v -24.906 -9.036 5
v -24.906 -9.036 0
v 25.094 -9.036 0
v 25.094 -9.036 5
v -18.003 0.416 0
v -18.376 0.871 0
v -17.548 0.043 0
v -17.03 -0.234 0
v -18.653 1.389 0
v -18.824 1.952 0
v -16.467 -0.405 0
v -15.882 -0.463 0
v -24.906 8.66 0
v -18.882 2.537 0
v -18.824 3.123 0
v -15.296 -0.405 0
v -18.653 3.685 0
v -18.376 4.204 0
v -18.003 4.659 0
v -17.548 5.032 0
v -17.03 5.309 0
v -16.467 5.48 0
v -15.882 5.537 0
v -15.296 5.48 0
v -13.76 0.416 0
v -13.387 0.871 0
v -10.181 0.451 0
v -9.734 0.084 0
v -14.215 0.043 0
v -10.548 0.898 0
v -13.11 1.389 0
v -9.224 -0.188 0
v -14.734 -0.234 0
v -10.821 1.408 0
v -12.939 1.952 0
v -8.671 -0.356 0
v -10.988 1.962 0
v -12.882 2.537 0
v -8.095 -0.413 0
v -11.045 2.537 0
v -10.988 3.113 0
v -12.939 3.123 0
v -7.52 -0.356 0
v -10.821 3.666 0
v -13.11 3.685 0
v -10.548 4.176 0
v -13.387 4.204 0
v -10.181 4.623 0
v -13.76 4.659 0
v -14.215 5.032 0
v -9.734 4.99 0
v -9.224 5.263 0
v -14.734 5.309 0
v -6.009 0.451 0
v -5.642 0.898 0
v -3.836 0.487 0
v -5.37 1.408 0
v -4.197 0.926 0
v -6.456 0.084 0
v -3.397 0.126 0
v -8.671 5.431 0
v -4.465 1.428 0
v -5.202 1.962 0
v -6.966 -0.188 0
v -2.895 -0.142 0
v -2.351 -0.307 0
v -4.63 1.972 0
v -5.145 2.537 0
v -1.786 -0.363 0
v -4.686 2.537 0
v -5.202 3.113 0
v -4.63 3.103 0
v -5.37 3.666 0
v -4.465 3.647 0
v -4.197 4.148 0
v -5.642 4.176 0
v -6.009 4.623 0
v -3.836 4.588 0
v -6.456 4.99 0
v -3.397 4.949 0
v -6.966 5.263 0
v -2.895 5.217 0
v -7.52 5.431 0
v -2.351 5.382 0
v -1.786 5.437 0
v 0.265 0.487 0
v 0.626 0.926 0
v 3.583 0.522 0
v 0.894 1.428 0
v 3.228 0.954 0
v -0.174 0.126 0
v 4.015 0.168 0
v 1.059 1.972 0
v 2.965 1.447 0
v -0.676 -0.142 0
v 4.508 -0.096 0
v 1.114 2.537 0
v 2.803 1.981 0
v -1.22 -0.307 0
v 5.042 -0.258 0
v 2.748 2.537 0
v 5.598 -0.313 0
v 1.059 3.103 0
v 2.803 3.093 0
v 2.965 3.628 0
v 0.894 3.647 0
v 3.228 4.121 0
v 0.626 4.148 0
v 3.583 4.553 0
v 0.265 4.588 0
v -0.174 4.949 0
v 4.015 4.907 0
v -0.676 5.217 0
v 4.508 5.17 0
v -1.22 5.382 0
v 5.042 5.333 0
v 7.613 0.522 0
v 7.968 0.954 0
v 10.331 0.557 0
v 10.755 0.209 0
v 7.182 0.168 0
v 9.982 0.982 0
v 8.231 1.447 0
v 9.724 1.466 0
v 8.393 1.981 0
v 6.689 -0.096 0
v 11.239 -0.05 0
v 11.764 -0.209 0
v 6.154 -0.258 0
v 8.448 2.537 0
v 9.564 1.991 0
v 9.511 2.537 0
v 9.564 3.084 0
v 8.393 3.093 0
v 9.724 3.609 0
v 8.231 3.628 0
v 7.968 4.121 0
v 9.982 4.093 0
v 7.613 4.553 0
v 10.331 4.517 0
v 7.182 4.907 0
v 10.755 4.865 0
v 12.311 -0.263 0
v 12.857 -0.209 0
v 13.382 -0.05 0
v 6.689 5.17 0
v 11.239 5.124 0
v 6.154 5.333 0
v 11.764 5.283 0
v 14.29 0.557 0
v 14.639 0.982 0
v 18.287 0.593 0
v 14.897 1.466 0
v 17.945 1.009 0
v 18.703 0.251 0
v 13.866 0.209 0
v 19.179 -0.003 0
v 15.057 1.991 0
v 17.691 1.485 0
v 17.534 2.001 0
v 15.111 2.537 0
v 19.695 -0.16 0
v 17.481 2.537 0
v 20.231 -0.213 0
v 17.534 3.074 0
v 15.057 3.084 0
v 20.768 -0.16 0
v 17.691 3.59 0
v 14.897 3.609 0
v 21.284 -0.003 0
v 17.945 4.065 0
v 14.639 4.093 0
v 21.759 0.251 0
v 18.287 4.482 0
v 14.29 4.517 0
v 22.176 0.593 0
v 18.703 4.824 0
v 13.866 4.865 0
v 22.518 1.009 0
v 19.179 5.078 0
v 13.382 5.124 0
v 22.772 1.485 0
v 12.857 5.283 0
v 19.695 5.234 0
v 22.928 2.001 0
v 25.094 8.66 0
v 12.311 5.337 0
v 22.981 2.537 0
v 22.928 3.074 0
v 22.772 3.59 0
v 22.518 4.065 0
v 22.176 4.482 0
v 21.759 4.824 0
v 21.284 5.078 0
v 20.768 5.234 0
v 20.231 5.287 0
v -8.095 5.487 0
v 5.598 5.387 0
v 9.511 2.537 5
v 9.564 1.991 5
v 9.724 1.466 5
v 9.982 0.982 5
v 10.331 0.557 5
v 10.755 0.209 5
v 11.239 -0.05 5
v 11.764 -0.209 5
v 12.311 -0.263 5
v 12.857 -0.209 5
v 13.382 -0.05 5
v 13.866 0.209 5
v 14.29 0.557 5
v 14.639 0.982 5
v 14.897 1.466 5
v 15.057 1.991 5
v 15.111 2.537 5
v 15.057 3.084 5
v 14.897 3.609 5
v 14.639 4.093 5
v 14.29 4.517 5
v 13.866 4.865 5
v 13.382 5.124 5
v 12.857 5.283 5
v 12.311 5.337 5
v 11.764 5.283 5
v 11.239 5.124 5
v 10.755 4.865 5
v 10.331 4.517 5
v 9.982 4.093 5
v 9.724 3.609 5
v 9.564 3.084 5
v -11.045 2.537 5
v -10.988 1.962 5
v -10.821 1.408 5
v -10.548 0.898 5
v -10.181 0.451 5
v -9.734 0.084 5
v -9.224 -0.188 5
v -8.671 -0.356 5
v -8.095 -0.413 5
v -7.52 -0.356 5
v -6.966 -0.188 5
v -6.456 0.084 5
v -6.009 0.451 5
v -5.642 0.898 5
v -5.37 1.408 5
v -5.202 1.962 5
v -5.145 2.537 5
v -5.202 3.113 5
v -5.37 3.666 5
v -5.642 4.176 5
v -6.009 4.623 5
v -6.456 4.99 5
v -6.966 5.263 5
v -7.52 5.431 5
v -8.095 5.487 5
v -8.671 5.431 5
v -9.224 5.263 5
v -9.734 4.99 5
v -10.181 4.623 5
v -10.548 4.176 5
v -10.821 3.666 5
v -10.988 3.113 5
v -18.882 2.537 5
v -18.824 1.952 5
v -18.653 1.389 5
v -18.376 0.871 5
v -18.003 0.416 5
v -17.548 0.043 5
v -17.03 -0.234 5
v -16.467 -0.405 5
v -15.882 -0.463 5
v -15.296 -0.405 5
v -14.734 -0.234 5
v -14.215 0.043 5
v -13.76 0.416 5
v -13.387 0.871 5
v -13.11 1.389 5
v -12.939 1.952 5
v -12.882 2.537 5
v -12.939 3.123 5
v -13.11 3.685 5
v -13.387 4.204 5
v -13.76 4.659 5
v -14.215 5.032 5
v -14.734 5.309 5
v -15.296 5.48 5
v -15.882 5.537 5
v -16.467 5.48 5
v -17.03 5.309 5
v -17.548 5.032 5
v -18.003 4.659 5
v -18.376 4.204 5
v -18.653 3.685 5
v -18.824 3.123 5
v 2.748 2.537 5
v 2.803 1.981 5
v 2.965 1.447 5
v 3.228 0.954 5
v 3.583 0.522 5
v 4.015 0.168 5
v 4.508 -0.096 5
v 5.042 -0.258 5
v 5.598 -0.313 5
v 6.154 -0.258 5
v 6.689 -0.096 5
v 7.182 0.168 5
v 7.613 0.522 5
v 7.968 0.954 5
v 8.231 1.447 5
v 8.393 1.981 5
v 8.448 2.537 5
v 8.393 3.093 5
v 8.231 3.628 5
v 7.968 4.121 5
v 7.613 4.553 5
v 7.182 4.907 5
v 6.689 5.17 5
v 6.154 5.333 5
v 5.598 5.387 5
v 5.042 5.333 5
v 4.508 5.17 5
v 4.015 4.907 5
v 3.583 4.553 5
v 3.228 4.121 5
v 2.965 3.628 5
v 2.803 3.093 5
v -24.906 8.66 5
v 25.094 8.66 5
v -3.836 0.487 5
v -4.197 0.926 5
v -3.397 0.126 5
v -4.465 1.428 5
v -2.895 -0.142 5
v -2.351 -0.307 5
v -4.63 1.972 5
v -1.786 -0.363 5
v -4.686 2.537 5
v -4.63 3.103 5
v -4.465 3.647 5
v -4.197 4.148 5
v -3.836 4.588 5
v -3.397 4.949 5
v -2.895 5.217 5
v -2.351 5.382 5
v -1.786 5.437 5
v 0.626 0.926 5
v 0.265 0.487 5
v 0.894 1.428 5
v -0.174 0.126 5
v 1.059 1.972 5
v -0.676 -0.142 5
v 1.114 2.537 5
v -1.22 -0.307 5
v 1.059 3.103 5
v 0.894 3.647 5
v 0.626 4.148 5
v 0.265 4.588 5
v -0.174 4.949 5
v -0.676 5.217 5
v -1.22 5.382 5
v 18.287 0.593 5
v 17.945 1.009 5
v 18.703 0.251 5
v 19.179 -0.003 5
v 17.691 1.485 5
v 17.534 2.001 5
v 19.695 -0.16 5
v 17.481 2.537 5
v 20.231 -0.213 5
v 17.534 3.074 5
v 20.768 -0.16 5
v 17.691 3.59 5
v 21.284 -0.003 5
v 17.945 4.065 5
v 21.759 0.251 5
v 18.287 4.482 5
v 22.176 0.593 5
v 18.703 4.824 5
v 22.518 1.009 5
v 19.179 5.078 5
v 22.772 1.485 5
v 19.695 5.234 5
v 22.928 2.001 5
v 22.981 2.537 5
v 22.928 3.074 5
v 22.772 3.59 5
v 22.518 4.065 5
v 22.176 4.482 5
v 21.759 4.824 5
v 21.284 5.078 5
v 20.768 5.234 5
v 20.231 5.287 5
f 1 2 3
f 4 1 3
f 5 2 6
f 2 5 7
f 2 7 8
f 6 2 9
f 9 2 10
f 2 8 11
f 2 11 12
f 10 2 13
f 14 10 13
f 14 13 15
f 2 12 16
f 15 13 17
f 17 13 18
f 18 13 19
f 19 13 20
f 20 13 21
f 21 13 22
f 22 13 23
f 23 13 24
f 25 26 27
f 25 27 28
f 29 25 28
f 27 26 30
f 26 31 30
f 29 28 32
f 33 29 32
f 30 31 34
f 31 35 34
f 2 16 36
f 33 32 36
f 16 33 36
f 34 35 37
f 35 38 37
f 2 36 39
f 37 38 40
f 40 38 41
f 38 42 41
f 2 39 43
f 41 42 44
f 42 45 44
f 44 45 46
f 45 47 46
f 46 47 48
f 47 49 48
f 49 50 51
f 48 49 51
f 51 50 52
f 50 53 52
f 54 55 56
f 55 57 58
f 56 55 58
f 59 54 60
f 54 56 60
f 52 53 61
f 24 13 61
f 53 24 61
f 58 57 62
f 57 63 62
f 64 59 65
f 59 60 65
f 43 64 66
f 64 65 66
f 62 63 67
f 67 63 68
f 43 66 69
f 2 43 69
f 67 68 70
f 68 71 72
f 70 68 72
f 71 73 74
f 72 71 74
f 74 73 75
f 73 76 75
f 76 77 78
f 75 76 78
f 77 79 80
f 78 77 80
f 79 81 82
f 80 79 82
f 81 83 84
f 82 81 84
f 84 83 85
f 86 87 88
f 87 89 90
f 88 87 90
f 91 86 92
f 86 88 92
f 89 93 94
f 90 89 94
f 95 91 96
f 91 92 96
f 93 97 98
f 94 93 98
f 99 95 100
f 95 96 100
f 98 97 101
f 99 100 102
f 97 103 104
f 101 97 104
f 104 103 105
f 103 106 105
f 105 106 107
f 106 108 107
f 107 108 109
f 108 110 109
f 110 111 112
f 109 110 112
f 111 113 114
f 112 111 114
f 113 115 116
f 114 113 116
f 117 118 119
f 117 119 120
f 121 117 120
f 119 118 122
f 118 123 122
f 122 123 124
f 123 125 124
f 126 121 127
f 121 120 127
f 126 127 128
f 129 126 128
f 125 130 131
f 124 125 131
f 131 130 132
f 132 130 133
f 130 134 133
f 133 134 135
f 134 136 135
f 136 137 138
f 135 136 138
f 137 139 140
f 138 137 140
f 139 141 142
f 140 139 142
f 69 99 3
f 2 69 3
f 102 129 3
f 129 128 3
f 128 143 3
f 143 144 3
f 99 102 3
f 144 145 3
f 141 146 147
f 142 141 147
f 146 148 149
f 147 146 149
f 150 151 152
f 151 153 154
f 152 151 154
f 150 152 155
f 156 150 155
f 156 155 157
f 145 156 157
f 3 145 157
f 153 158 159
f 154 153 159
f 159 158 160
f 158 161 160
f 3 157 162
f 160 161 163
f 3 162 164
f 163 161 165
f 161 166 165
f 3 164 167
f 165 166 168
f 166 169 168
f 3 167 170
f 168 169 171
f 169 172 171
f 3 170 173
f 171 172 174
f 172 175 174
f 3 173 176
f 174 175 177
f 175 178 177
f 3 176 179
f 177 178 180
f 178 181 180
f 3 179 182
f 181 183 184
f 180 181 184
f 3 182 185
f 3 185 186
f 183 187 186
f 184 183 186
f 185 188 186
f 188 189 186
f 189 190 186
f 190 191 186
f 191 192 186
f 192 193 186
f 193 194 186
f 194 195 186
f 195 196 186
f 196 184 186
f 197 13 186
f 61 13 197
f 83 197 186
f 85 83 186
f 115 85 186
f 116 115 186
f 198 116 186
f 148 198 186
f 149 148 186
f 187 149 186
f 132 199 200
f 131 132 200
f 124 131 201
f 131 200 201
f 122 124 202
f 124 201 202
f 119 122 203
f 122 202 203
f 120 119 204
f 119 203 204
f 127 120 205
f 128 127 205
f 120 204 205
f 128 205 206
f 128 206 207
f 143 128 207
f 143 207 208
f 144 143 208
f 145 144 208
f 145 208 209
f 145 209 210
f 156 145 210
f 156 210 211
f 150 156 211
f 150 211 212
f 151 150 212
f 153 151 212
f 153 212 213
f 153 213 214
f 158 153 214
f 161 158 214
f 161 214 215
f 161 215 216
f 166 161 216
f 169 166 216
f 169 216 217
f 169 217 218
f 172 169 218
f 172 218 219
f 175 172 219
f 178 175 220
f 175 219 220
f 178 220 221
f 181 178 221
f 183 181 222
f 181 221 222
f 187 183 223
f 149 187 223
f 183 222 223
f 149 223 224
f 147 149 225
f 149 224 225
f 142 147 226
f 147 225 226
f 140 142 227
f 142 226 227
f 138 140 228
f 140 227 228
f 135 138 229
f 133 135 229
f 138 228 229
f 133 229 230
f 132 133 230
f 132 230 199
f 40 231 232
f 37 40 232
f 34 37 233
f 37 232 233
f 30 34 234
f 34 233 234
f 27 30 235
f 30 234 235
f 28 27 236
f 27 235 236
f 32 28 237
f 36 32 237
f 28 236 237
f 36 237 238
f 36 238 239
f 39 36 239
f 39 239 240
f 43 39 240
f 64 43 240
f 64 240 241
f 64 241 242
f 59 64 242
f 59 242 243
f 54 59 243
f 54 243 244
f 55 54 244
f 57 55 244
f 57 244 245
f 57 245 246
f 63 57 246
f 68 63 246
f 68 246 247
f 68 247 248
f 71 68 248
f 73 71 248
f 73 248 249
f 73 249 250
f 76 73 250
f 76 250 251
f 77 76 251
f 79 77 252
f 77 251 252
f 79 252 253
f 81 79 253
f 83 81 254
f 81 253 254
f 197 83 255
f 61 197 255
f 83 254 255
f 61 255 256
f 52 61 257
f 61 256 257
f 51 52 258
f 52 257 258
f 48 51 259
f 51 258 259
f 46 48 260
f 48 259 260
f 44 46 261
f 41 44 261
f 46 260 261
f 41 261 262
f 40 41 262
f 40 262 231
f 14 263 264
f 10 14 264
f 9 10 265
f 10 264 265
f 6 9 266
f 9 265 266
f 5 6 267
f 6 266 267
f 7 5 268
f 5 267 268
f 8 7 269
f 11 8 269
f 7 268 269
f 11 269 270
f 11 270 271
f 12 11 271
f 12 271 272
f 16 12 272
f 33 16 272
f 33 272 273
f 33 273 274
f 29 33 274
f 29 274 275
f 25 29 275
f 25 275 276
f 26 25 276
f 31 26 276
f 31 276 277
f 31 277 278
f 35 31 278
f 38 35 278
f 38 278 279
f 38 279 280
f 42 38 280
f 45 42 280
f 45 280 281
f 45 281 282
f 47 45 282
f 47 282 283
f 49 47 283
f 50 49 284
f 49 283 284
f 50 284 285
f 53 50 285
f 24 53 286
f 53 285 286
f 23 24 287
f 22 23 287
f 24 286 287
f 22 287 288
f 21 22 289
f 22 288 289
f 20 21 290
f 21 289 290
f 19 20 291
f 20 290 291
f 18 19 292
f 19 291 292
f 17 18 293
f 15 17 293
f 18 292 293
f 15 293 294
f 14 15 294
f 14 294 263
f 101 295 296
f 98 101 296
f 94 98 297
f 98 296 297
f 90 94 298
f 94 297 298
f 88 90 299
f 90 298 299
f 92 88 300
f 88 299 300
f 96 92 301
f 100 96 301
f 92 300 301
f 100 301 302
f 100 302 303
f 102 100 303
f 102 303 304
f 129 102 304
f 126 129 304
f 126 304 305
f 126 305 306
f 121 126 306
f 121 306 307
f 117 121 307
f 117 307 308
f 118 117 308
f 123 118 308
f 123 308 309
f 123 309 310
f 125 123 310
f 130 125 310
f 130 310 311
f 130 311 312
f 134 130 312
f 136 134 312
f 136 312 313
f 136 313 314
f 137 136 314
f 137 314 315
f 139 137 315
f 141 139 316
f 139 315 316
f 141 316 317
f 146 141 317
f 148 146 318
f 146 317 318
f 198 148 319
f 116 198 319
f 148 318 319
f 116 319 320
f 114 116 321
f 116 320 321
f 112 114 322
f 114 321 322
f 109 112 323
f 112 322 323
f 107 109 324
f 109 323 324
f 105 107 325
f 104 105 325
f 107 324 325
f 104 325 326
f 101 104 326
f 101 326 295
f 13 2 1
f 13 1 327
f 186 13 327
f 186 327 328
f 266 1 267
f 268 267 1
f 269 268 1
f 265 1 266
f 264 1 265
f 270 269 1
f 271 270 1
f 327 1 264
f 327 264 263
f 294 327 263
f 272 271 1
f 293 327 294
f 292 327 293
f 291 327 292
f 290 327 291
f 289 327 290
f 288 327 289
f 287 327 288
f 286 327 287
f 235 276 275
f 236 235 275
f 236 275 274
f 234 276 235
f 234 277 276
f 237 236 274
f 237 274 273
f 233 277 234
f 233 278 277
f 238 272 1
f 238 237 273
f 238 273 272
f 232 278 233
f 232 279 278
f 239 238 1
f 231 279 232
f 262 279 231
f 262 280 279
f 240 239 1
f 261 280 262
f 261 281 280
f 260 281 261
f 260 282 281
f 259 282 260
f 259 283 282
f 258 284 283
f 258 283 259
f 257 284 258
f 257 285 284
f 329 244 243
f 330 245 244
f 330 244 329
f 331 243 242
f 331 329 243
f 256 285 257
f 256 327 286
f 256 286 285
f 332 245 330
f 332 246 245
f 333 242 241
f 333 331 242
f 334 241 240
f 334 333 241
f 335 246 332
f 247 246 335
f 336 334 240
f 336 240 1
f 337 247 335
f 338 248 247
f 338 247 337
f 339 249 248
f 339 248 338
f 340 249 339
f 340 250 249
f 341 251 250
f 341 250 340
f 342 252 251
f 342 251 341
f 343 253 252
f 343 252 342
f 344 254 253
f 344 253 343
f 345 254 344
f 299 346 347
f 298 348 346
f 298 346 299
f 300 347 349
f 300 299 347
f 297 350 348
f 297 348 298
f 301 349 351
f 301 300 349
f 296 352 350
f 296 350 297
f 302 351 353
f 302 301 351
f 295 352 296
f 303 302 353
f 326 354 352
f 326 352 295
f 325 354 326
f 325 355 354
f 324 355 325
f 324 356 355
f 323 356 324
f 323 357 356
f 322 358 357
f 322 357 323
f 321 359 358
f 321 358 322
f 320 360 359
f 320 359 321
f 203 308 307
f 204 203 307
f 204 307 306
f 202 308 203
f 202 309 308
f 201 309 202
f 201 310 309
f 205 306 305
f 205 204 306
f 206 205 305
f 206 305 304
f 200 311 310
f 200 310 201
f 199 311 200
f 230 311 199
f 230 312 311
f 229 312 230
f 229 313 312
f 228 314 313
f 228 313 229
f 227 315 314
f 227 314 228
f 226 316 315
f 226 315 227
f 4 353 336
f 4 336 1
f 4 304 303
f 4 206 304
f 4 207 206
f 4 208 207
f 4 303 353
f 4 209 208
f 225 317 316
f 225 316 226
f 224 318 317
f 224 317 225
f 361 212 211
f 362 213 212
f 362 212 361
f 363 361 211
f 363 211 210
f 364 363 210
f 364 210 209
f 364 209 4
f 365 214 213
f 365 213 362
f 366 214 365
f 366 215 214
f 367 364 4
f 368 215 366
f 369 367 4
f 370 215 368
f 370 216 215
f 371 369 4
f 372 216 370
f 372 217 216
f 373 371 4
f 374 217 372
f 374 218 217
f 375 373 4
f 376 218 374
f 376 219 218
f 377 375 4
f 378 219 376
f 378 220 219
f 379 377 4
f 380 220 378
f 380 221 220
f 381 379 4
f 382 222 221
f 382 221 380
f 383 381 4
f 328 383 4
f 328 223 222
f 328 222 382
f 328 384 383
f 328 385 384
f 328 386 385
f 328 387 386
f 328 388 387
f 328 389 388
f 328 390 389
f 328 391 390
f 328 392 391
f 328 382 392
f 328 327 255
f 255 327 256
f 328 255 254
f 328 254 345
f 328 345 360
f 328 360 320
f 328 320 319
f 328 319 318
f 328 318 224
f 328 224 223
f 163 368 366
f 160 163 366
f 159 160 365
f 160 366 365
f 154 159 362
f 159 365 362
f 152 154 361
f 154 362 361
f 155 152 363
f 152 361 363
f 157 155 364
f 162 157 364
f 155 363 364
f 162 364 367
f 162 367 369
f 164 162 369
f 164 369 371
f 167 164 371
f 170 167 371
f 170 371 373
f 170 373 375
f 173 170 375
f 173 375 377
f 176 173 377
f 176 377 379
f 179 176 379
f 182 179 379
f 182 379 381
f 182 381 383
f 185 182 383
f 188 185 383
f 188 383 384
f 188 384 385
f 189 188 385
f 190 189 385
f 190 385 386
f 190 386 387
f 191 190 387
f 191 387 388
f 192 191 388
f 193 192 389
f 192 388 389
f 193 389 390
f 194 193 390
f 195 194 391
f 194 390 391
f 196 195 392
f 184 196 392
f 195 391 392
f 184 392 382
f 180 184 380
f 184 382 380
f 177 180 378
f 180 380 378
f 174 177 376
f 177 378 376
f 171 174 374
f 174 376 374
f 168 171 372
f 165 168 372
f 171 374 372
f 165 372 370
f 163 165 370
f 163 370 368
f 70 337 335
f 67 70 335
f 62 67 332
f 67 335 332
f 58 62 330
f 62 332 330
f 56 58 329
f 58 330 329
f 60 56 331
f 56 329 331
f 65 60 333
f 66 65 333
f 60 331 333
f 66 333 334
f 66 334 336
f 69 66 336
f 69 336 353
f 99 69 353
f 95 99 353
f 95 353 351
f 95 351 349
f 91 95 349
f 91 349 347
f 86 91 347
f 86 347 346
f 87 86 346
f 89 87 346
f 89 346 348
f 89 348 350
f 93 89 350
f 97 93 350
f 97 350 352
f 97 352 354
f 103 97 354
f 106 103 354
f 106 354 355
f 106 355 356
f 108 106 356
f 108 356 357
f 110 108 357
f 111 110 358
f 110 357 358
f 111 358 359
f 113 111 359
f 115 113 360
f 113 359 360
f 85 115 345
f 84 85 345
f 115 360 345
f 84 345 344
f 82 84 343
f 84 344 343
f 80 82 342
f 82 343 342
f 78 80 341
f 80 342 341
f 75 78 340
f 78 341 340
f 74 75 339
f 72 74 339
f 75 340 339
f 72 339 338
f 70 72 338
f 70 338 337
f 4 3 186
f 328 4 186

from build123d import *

# Parameters (mm, degrees)
F0_W     = 50
F0_H     = 17.6952143589
F1_DEPTH = 5
F2_D     = 6
F2_DEPTH = 12
F2_TIP   = 1.8025818571
F3_D     = 5.9
F3_DEPTH = 12
F3_TIP   = 1.7725388261
F4_D     = 5.8
F4_DEPTH = 12
F4_TIP   = 1.7424957952
F5_D     = 5.7
F5_DEPTH = 12
F5_TIP   = 1.7124527642
F6_D     = 5.6
F6_DEPTH = 12
F6_TIP   = 1.6824097333
F7_D     = 5.5
F7_DEPTH = 12
F7_TIP   = 1.6523667023


with BuildPart() as f1:
    # F0 (on Top) → F1 (new body)
    with BuildSketch(Plane.XY):
        with Locations((0.0939741731, -0.1879474148)):
            Rectangle(F0_W, F0_H)
    extrude(amount=F1_DEPTH)

    # F2
    with Locations(Plane(origin=(0, 0, 0), x_dir=(1, 0, 0), z_dir=(0, 0, -1))):
        with Locations((-15.8815626055, -2.5372912642)):
            Hole(F2_D / 2, depth=F2_DEPTH)
            with Locations((0, 0, -(F2_DEPTH + F2_TIP / 2))):  # 118° drill point
                Cone(0, F2_D / 2, F2_TIP, mode=Mode.SUBTRACT)

    # F3
    with Locations(Plane(origin=(0, 0, 0), x_dir=(1, 0, 0), z_dir=(0, 0, -1))):
        with Locations((-8.0951671781, -2.5372912642)):
            Hole(F3_D / 2, depth=F3_DEPTH)
            with Locations((0, 0, -(F3_DEPTH + F3_TIP / 2))):  # 118° drill point
                Cone(0, F3_D / 2, F3_TIP, mode=Mode.SUBTRACT)

    # F4
    with Locations(Plane(origin=(0, 0, 0), x_dir=(1, 0, 0), z_dir=(0, 0, -1))):
        with Locations((-1.7855006403, -2.5372912642)):
            Hole(F4_D / 2, depth=F4_DEPTH)
            with Locations((0, 0, -(F4_DEPTH + F4_TIP / 2))):  # 118° drill point
                Cone(0, F4_D / 2, F4_TIP, mode=Mode.SUBTRACT)

    # F5
    with Locations(Plane(origin=(0, 0, 0), x_dir=(1, 0, 0), z_dir=(0, 0, -1))):
        with Locations((5.5981517902, -2.5372912642)):
            Hole(F5_D / 2, depth=F5_DEPTH)
            with Locations((0, 0, -(F5_DEPTH + F5_TIP / 2))):  # 118° drill point
                Cone(0, F5_D / 2, F5_TIP, mode=Mode.SUBTRACT)

    # F6
    with Locations(Plane(origin=(0, 0, 0), x_dir=(1, 0, 0), z_dir=(0, 0, -1))):
        with Locations((12.3105607927, -2.5372912642)):
            Hole(F6_D / 2, depth=F6_DEPTH)
            with Locations((0, 0, -(F6_DEPTH + F6_TIP / 2))):  # 118° drill point
                Cone(0, F6_D / 2, F6_TIP, mode=Mode.SUBTRACT)

    # F7
    with Locations(Plane(origin=(0, 0, 0), x_dir=(1, 0, 0), z_dir=(0, 0, -1))):
        with Locations((20.2312065022, -2.5372912642)):
            Hole(F7_D / 2, depth=F7_DEPTH)
            with Locations((0, 0, -(F7_DEPTH + F7_TIP / 2))):  # 118° drill point
                Cone(0, F7_D / 2, F7_TIP, mode=Mode.SUBTRACT)


solid = f1.part
